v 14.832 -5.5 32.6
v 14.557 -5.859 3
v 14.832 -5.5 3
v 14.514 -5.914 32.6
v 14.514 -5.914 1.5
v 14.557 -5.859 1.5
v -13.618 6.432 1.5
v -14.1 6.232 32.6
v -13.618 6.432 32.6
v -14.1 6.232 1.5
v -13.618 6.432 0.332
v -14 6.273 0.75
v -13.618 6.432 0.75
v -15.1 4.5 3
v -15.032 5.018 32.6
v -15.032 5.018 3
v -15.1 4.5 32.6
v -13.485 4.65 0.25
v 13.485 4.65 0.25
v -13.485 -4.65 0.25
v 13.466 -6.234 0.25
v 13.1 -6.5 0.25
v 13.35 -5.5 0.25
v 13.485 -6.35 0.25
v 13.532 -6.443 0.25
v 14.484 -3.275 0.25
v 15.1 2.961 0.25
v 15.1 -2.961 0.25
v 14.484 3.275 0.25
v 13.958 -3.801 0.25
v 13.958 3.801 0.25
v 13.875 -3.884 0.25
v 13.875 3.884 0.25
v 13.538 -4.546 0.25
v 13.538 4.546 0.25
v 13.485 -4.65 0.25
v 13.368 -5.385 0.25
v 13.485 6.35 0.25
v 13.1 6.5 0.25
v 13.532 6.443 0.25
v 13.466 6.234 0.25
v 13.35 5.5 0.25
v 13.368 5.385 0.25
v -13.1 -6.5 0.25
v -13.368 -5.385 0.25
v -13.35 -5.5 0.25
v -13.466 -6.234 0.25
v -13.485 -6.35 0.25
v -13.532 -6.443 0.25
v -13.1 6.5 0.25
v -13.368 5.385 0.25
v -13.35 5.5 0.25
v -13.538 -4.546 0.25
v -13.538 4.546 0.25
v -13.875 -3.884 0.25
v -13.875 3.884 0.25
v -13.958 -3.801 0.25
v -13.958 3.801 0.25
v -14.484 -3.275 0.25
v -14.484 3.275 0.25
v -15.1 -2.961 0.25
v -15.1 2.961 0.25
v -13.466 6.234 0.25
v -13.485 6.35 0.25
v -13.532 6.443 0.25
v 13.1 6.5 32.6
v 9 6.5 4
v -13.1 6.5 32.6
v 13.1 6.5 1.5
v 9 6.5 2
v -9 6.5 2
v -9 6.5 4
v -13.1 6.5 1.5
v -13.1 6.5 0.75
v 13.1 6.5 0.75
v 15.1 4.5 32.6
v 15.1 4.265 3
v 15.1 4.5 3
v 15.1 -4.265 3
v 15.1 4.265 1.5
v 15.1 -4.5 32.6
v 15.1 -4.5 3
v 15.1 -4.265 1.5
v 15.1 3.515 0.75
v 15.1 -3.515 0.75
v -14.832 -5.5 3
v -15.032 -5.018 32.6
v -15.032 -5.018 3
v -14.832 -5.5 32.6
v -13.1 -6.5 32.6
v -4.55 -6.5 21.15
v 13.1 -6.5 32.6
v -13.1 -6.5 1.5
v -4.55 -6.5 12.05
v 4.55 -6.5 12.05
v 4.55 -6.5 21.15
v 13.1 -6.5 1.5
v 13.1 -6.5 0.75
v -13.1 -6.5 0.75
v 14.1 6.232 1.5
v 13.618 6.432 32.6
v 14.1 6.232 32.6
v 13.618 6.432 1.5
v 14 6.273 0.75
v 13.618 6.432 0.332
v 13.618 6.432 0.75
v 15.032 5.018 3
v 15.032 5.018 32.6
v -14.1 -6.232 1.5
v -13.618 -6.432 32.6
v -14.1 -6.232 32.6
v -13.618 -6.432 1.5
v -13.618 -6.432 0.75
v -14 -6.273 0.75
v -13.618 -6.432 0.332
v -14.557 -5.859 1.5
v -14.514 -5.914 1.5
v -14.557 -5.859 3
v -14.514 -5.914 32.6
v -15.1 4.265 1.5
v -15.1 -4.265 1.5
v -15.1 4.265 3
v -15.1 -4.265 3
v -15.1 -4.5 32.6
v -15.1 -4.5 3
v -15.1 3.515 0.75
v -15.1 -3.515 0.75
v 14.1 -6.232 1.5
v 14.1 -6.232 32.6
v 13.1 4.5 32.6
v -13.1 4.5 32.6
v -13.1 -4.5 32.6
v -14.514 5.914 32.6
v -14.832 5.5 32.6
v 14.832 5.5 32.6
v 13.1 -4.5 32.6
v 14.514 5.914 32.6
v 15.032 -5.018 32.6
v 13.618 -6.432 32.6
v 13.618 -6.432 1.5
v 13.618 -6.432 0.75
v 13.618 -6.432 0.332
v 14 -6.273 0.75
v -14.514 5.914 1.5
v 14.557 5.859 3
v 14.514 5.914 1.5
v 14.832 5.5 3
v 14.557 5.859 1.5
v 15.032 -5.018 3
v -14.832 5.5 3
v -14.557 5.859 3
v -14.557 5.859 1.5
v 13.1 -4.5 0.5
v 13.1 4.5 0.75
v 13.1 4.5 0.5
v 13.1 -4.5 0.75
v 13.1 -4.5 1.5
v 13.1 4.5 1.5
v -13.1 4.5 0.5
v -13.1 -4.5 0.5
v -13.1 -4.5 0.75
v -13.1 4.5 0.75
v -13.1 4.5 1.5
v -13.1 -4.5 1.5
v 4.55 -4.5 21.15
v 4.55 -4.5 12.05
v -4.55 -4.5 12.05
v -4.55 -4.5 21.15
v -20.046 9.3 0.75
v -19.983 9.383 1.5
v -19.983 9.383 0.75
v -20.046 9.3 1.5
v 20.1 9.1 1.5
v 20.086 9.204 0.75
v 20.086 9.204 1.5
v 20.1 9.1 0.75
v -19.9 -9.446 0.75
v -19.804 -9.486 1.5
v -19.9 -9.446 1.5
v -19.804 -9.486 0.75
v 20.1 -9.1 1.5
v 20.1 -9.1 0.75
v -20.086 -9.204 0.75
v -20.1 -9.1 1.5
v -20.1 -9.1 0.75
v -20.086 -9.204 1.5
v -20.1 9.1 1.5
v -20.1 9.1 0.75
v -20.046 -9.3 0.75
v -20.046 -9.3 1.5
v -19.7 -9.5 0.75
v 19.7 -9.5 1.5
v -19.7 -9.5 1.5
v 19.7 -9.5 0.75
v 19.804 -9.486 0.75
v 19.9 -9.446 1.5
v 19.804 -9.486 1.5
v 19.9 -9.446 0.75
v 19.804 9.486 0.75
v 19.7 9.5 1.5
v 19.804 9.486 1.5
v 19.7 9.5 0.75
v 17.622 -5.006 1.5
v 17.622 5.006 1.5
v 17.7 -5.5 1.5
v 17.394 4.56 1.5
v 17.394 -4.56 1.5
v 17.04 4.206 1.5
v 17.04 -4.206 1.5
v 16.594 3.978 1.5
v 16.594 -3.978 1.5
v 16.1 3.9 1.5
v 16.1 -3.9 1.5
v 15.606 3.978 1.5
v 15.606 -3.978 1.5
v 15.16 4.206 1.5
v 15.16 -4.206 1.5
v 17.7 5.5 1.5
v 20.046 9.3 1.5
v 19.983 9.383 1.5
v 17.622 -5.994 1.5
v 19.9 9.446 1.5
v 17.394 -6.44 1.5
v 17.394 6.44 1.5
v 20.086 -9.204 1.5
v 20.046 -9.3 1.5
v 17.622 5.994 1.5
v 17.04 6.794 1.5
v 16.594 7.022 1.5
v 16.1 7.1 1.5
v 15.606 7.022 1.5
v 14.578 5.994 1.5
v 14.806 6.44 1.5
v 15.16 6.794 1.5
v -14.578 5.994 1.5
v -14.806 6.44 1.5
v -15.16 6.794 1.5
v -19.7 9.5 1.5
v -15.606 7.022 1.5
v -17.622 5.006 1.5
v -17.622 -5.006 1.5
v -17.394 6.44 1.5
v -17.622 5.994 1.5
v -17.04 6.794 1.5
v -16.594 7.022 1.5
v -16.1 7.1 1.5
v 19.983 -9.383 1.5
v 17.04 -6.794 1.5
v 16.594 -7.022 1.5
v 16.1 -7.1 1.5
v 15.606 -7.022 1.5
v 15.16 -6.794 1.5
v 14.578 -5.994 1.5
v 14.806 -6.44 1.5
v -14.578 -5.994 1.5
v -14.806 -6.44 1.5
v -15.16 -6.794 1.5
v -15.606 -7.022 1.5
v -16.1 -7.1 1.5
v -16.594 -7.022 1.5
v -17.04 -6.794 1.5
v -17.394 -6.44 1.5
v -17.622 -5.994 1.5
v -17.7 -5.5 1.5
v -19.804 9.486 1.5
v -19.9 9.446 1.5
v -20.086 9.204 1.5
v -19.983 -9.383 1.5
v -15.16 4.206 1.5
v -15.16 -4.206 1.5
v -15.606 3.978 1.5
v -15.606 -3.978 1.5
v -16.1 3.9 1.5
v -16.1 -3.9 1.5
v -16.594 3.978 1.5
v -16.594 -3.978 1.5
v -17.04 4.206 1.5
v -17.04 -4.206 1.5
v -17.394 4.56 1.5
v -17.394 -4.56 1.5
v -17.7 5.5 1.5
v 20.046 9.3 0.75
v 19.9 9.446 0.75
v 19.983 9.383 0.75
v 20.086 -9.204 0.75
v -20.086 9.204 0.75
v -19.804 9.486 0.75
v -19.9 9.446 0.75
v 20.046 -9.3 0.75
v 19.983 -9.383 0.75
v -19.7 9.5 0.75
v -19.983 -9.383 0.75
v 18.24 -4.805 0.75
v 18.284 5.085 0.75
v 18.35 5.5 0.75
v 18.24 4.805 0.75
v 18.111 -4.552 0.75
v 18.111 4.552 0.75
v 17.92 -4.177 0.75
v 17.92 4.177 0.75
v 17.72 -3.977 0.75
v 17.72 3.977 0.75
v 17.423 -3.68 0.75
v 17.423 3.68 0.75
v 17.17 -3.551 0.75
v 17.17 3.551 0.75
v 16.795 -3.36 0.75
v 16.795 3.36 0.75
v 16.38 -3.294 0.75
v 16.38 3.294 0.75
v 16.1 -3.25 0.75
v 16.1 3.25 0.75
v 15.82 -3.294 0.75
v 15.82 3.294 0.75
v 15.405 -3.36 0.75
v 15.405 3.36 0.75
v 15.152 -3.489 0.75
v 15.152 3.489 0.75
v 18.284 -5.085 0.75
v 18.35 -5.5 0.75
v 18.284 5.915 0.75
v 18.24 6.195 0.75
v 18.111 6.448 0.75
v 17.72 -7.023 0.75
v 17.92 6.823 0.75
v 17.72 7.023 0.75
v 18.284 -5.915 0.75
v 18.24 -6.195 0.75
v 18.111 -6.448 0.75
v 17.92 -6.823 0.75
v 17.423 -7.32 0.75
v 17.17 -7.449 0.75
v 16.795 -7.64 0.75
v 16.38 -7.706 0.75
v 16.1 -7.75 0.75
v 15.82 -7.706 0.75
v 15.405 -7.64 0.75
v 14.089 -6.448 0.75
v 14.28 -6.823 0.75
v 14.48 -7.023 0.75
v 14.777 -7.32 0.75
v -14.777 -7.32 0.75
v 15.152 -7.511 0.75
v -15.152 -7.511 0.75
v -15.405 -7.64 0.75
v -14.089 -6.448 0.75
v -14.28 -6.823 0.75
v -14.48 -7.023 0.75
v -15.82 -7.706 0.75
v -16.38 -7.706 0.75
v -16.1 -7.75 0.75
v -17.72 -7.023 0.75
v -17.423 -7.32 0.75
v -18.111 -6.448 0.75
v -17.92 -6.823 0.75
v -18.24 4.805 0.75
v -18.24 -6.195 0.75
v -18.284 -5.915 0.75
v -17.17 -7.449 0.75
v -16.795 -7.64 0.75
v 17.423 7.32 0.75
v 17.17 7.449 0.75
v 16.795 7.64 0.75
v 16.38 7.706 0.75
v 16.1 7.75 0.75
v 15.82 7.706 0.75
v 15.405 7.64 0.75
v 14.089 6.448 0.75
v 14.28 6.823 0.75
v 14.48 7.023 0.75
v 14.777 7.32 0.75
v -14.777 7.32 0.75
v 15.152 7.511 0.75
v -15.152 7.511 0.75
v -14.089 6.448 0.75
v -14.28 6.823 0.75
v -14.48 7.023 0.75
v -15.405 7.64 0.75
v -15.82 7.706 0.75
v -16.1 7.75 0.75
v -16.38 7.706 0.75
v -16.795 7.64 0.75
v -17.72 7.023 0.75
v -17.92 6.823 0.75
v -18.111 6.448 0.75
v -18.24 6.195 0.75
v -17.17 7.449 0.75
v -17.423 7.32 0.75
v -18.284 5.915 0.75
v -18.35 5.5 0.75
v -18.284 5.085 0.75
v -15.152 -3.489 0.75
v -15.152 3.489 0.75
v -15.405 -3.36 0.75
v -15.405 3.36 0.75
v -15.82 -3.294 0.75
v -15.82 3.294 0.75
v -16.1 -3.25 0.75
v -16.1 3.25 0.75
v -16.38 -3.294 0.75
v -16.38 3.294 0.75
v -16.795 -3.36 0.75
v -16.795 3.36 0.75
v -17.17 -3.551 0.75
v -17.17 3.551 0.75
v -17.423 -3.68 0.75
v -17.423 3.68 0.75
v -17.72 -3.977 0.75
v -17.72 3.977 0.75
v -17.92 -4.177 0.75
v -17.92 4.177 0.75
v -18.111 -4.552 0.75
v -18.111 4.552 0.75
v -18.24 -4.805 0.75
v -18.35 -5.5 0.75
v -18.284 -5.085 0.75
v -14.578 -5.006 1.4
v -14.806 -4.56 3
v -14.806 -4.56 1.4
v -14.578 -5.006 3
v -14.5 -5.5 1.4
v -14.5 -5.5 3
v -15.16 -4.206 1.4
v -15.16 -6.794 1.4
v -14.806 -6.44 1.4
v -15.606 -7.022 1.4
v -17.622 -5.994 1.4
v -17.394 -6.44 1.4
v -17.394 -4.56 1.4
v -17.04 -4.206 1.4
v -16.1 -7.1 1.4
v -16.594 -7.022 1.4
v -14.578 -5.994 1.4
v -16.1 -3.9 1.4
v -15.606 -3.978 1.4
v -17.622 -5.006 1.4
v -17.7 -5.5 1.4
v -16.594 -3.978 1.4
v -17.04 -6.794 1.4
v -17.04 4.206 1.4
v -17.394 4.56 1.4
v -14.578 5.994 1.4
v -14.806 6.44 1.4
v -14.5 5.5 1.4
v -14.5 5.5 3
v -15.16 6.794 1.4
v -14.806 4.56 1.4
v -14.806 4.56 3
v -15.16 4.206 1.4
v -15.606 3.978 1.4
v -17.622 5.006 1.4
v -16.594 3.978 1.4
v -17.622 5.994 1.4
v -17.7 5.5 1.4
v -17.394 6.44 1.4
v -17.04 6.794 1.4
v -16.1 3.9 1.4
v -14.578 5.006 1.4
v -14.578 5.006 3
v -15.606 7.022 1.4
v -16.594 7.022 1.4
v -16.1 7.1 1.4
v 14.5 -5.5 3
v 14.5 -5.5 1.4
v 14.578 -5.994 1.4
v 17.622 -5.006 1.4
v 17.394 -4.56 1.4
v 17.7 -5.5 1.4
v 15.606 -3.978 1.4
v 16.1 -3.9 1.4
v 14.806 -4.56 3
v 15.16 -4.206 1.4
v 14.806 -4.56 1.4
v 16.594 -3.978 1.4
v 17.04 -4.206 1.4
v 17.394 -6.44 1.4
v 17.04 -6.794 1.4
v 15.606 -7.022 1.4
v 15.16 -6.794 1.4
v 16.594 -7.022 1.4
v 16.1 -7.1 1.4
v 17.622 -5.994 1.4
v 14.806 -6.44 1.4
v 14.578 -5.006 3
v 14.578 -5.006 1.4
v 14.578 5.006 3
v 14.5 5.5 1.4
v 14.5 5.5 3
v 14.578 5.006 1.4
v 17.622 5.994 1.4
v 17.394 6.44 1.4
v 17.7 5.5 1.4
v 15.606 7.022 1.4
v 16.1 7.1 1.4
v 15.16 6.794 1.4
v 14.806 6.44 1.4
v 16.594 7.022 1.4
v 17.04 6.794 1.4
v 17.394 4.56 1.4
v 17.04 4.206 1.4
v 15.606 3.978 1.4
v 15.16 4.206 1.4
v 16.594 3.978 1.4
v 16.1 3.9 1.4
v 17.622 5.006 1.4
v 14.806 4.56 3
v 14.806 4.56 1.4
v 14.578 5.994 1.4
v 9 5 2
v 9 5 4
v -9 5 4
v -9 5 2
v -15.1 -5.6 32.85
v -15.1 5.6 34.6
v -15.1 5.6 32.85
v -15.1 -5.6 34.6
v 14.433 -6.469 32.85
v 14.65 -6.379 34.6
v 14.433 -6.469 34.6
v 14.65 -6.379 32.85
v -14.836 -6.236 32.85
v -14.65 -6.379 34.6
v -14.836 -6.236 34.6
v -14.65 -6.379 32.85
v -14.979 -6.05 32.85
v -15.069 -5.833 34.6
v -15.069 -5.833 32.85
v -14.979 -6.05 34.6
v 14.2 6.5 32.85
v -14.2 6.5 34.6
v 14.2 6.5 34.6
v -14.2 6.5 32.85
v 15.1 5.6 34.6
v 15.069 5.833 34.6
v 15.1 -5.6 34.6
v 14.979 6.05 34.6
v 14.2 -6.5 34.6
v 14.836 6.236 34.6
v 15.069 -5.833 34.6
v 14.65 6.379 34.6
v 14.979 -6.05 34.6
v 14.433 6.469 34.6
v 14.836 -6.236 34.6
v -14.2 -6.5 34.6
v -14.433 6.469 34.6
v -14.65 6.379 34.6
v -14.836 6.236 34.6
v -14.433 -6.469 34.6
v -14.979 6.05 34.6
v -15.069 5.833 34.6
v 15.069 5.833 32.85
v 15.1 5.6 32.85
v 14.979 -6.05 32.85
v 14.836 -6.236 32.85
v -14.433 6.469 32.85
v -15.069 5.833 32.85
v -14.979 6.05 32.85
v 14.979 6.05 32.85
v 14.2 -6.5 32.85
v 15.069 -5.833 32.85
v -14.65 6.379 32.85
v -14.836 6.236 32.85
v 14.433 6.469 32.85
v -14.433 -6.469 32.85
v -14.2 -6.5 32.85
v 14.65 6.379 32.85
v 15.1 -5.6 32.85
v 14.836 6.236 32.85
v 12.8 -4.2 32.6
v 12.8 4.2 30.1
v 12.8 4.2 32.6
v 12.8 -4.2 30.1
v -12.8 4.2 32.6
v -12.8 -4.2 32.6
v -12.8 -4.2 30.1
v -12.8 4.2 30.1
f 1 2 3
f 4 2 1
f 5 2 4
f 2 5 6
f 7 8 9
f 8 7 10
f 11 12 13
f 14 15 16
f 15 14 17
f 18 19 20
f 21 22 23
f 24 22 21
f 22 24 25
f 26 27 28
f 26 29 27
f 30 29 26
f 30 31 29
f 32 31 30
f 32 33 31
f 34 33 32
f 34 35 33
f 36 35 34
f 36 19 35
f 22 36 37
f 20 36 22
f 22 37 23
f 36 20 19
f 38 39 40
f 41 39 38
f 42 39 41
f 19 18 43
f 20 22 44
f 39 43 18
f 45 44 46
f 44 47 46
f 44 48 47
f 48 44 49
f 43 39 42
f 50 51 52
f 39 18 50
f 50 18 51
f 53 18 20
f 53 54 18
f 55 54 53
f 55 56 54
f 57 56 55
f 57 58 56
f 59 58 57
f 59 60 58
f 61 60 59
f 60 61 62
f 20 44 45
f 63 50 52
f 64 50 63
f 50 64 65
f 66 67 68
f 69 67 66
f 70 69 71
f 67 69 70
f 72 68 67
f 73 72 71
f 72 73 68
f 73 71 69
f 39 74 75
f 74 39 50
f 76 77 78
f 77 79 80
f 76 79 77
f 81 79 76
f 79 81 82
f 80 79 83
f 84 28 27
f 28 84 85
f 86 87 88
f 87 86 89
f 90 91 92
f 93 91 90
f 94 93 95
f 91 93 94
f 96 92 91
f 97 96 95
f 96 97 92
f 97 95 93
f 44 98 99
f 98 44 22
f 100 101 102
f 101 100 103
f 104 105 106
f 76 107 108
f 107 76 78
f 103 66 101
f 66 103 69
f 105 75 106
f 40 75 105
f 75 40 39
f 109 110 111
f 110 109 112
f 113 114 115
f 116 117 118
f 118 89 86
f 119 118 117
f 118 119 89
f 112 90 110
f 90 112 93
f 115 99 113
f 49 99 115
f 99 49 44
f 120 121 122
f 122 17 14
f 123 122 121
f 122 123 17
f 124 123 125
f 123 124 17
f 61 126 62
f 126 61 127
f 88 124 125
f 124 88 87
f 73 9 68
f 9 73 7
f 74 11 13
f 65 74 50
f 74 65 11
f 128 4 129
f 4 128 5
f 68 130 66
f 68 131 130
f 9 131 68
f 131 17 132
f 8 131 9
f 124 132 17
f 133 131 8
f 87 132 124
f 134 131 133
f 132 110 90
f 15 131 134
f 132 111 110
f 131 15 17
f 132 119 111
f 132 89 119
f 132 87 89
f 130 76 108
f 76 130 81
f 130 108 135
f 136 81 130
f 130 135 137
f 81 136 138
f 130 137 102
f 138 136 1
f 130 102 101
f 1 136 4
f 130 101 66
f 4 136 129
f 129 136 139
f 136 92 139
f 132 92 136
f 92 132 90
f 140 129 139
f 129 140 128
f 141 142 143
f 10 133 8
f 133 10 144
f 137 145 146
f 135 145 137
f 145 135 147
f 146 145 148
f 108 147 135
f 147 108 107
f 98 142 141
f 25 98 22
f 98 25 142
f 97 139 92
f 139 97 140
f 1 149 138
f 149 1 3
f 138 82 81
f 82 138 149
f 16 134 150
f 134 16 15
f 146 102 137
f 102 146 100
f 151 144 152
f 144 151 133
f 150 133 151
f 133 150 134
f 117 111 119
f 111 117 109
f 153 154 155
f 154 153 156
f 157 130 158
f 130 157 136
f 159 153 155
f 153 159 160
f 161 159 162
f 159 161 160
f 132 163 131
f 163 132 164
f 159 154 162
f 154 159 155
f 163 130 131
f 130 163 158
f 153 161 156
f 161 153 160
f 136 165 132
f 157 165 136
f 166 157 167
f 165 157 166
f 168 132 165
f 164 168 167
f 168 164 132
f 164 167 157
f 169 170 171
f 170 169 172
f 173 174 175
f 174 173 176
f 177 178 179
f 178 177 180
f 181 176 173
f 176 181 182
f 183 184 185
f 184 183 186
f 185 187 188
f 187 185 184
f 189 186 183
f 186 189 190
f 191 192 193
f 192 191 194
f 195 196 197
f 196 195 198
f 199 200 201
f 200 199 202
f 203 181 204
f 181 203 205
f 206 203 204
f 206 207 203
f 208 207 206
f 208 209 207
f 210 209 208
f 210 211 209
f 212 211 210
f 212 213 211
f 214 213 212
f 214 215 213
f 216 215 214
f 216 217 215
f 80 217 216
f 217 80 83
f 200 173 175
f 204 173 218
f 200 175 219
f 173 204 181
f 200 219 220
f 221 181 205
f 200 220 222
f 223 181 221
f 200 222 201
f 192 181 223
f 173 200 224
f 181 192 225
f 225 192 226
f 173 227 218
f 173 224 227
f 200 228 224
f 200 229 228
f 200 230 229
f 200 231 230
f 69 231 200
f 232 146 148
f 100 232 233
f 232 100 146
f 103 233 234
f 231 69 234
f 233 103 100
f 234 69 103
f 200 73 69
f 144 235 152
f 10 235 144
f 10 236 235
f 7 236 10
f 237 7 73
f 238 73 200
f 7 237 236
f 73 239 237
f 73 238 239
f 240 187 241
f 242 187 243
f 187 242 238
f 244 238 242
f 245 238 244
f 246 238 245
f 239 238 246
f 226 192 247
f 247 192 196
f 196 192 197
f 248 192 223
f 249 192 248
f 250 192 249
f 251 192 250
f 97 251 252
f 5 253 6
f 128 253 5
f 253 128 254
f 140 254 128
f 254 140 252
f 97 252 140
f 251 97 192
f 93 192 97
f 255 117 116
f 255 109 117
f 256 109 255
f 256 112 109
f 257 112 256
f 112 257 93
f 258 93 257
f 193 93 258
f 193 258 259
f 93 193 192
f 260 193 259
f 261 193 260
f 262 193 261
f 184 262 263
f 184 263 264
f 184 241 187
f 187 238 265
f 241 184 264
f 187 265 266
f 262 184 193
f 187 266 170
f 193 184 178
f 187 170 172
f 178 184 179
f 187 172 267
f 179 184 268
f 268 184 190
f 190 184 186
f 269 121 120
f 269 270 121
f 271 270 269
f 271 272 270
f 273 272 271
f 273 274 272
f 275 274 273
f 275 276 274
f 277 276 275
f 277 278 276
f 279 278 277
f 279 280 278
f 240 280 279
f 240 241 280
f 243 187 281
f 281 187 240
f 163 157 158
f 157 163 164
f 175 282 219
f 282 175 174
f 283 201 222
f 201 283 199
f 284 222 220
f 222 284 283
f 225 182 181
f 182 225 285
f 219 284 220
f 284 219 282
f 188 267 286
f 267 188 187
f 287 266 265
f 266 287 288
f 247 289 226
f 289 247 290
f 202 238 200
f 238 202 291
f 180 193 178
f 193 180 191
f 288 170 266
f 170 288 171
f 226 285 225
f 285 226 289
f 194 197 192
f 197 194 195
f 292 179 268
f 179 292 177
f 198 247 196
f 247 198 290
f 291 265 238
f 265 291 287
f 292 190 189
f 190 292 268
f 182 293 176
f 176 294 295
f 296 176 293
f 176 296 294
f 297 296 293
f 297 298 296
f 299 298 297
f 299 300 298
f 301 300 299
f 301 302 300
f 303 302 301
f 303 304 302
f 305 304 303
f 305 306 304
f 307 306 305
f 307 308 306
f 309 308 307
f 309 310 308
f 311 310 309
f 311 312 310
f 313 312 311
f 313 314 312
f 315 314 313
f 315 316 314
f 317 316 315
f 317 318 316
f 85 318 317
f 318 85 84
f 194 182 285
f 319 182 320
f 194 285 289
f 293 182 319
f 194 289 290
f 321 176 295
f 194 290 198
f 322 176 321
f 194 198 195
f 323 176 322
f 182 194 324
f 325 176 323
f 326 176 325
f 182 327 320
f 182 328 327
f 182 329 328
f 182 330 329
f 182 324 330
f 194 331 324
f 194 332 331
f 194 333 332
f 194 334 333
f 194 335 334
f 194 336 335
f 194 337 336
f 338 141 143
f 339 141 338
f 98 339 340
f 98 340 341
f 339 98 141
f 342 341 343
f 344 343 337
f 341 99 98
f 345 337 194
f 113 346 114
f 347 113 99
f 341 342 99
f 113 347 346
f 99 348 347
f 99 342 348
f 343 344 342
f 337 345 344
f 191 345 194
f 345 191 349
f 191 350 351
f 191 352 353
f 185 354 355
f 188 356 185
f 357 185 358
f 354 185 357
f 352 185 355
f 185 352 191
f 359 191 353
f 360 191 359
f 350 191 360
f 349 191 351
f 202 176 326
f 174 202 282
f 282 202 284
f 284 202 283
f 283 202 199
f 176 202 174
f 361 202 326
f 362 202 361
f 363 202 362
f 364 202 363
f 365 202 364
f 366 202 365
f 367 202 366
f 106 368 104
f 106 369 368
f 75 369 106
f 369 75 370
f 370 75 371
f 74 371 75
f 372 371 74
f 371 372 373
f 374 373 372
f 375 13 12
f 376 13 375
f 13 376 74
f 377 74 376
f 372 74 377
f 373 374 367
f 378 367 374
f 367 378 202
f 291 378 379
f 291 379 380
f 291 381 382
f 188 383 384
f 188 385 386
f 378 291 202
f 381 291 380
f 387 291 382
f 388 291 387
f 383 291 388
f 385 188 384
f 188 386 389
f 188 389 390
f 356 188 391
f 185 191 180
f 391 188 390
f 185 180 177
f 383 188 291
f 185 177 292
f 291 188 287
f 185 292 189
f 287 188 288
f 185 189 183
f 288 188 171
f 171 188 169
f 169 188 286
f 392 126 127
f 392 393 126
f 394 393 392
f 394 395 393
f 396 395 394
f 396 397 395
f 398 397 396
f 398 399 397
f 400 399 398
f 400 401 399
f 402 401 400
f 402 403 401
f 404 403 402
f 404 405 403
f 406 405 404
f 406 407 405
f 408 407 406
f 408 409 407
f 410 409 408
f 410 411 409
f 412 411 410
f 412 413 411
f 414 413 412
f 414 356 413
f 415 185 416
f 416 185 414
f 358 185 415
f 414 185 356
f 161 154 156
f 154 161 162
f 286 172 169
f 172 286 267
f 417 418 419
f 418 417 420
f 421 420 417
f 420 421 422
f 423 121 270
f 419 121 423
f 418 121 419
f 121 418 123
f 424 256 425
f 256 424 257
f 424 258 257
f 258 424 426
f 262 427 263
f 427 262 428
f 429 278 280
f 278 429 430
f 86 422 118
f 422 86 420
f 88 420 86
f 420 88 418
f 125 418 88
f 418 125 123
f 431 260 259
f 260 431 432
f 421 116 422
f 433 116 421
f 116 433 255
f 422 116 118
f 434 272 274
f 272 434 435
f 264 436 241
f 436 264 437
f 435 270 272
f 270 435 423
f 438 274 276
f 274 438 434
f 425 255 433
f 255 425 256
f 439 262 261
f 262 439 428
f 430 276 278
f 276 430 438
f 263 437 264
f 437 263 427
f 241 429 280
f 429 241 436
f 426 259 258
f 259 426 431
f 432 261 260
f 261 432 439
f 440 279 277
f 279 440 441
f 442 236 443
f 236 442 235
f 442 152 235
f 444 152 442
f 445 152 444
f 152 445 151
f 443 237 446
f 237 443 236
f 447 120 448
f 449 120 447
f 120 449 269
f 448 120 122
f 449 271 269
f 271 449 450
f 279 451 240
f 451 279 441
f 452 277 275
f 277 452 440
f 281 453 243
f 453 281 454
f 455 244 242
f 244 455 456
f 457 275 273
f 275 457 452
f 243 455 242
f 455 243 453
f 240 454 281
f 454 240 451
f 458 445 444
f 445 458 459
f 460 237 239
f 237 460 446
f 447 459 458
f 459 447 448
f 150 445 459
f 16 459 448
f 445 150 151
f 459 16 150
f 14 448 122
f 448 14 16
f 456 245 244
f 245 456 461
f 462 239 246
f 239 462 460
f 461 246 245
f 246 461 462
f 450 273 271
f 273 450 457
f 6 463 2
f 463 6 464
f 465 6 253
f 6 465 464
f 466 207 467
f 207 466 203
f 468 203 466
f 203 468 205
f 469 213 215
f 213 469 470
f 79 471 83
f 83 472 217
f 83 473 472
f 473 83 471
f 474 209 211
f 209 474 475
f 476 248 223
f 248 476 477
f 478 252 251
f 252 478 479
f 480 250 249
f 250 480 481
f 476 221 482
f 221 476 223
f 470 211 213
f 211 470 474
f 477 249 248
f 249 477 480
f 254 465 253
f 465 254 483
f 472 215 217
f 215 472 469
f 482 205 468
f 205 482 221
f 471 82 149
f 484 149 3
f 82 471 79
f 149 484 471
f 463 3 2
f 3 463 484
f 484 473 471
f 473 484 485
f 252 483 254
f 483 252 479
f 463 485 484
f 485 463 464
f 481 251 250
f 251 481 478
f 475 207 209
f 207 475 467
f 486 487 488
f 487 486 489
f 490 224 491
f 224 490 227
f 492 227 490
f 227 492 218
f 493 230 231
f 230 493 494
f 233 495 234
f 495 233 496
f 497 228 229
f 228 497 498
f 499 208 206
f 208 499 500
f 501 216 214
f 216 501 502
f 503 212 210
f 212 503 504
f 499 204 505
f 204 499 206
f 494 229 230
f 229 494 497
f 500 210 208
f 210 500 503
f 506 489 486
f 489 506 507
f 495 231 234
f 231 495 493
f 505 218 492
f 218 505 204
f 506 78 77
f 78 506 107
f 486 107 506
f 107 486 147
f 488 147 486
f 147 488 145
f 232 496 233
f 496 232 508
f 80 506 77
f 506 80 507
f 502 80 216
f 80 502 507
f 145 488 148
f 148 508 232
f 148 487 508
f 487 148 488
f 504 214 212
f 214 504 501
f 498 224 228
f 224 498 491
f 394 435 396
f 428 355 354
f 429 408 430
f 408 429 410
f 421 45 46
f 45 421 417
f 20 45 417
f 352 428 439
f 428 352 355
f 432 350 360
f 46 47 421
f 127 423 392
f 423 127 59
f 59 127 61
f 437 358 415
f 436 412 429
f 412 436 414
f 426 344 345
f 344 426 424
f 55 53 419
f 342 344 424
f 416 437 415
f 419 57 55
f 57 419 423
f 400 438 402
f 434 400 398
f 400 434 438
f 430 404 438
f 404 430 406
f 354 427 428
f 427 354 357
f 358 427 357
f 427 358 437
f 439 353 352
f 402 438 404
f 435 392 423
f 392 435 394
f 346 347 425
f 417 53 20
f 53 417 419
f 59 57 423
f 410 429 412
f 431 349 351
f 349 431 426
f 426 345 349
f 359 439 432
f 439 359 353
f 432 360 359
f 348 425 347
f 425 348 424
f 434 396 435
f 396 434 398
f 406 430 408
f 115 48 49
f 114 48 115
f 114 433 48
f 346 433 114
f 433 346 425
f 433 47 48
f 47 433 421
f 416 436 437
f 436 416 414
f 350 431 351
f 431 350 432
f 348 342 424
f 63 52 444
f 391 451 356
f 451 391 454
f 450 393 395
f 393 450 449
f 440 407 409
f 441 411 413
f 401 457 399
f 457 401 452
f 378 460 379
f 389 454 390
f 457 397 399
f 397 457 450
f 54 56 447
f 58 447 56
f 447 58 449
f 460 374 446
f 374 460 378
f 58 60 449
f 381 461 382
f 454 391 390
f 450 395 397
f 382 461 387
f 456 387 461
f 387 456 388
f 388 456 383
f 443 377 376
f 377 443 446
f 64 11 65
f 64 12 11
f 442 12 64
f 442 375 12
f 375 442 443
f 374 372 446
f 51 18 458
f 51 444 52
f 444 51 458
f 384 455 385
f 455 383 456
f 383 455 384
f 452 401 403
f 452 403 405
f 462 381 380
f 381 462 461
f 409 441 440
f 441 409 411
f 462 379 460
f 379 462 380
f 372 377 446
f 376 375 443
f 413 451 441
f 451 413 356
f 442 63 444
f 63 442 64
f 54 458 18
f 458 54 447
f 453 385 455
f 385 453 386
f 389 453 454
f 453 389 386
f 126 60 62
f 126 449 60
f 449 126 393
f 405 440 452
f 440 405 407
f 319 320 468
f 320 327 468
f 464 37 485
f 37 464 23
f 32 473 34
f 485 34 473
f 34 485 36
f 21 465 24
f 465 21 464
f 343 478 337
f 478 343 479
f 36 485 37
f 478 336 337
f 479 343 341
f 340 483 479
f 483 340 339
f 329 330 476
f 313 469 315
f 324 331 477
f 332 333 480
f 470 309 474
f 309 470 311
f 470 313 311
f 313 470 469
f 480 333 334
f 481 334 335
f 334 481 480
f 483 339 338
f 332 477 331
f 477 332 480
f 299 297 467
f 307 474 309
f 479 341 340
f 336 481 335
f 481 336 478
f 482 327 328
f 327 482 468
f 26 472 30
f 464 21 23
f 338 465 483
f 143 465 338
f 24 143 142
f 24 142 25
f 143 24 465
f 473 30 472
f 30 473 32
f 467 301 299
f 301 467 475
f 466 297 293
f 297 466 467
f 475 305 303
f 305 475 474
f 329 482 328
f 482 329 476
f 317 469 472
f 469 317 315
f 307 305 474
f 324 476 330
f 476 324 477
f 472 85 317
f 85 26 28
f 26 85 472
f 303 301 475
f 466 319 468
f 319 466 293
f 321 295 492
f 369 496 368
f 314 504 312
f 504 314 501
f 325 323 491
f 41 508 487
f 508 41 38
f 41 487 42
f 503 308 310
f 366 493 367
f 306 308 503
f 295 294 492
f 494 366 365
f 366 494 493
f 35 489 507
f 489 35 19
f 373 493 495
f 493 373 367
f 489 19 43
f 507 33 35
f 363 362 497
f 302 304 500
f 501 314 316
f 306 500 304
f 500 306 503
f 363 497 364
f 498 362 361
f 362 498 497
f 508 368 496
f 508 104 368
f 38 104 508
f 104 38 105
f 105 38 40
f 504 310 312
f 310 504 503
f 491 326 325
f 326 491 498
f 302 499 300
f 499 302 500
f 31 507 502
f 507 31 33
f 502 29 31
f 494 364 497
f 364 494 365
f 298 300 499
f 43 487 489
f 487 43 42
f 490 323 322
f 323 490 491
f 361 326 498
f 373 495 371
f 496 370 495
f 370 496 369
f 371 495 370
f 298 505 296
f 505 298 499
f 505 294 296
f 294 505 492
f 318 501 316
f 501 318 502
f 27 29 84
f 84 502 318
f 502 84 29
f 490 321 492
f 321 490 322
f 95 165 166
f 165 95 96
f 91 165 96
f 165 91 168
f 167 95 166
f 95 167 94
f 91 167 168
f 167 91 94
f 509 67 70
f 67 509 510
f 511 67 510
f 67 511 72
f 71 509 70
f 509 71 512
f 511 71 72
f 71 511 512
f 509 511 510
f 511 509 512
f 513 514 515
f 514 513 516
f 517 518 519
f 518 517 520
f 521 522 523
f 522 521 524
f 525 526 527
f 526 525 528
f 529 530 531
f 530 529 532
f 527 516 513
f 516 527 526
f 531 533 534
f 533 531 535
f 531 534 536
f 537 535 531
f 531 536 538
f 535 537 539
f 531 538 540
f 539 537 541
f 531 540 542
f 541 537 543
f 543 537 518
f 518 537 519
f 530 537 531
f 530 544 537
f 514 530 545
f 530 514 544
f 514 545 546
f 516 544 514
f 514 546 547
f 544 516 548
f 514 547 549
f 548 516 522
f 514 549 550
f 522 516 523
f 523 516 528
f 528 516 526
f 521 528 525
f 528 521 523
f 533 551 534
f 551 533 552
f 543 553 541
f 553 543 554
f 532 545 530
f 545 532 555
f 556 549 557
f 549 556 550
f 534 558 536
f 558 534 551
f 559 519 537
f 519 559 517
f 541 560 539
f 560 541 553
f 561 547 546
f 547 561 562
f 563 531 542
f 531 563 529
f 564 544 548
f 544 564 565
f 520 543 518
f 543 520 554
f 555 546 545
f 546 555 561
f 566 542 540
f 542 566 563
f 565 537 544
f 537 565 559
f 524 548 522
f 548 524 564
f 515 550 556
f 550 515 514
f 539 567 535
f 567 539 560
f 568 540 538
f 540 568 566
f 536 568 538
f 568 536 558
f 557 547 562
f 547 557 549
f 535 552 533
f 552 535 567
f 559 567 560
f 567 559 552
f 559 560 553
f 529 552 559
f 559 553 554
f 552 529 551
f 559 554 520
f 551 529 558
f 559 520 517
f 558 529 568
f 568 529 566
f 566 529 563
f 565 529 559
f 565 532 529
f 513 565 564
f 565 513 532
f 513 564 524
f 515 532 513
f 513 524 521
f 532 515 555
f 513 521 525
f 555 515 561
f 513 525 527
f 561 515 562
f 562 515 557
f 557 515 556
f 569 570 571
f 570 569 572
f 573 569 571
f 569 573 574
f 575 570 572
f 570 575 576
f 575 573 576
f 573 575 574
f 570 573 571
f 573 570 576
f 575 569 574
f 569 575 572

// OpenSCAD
// Indoor Enclosure for Raspberry Pi Camera Rev 1.3
// Two pieces: housing + snap-on lid.
// Lens faces forward through a SQUARE port cut flush through the front wall
// (no collar, no protrusion). Board slides in from top. Lid snaps on with
// cable slot. Screw holes in base flange for mounting.

/* ── Camera board ── */
board_w      = 25;
board_h      = 24;
board_t      = 1.2;
hole_spacing = 21;
hole_dia     = 2.2;

lens_dia     = 8.5;      // lens barrel diameter
lens_h       = 5.0;      // lens height above PCB
lens_cx      = 0;        // lens X offset from board center
lens_cy      = 2.0;      // lens Y offset — ABOVE center, toward connector

/* ── Enclosure ── */
wall         = 2.0;
clearance    = 0.6;
cable_w      = 18;       // ribbon cable exit width (1.8cm)
cable_top    = 6;        // clearance above board for cable connector
corner_r     = 2;

/* Square lens port — REPLACES the old collar + circular bore.
   Same 9.1mm size as the old circular hole (0.6mm clearance). */
square_hole_side = lens_dia + 0.6;   // 9.1mm square bore
square_recess    = 3.0;              // mm the port recesses into the interior

// Base flange screws
flange_screw_dia = 3.2;  // M3 clearance

// Lid snap-fit
snap_tol     = 0.3;      // tolerance for snap fit
snap_depth   = 1.5;      // how deep the lip sits
lip_h        = 2.5;      // inner lip height on lid

/* ── Derived ──
   X = width, Y = depth (front = -Y), Z = height
   Front face is at Y = -(outer_z/2)
*/
inner_x = board_w + 2 * clearance;
inner_z = max(board_t + lens_h + 2 * clearance, 9);
inner_y = board_h + clearance + cable_top;
outer_x = inner_x + 2 * wall;
outer_z = inner_z + 2 * wall;
outer_y = inner_y + wall;   // walls on bottom + sides, lid closes top

flange_x = outer_x + 10;
flange_z = outer_z + 6;

// Lens Z (height) position from base
lens_y = wall + clearance + board_h/2 + lens_cy;

/* ══════════════════════════════
   Housing — open top, board slides in
   ══════════════════════════════ */
module camera_housing() {
    difference() {
        union() {
            // Main body — open top box
            difference() {
                rounded_box(outer_x, outer_z, outer_y, corner_r);
                // Hollow inside (open top)
                translate([0, 0, wall + inner_y/2])
                    cube([inner_x, inner_z, inner_y + wall + 1], center=true);
            }

            // Base flange
            translate([0, 0, wall/4])
                rounded_box(flange_x, flange_z, wall/2, corner_r + 2);
        }

        // --- Square lens port through the front wall (no collar) ---
        // Front face at Y = -(outer_z/2). Cut starts FLUSH with the front face,
        // goes through the full wall thickness, and recesses a little into
        // the interior so the lens has a ledge to seat against.
        port_front_y   = -(outer_z/2);                         // - front face
        port_back_y    = port_front_y + wall + square_recess;  // into interior
        port_center_y  = (port_front_y + port_back_y) / 2;
        port_y_extent  = port_back_y - port_front_y;

        translate([lens_cx, port_center_y, lens_y])
            cube([square_hole_side, port_y_extent, square_hole_side], center=true);

        // Flange screw holes (4 corners)
        for (x = [-(flange_x/2 - 4), (flange_x/2 - 4)])
            for (y = [-(flange_z/2 - 4), (flange_z/2 - 4)])
                translate([x, y, -1])
                    cylinder(d=flange_screw_dia, h=wall + 2, $fn=20);

        // Countersinks
        for (x = [-(flange_x/2 - 4), (flange_x/2 - 4)])
            for (y = [-(flange_z/2 - 4), (flange_z/2 - 4)])
                translate([x, y, -0.1])
                    cylinder(d1=flange_screw_dia + 3, d2=flange_screw_dia, h=1.5, $fn=20);

        // Cable exit slot — horizontal slit in rear wall, near bottom
        translate([0, (outer_z/2), wall + 1])
            cube([18, wall + 1, 2], center=true);
    }
}

/* ══════════════════════════════
   Lid — snaps on top, has cable slot
   ══════════════════════════════ */
module camera_lid() {
    // Cap: Y=0 to Y=wall (flat top surface)
    // Lip: Y=-lip_h to Y=0 (hangs into housing)
    union() {
        // Flat cap
        rounded_box(outer_x, outer_z, wall, corner_r);

        // Lip hanging below cap
        translate([0, 0, -lip_h/2])
            cube([inner_x - 2*snap_tol, inner_z - 2*snap_tol, lip_h], center=true);
    }

    // Snap bumps on the lip
    for (yy = [-(inner_z/2 - snap_tol - 0.3), (inner_z/2 - snap_tol - 0.3)])
        translate([0, yy, -lip_h + 0.8])
            cube([inner_x/2, 0.6, 1.5], center=true);
}

/* ── Helper ── */
module rounded_box(w, h, d, r) {
    rr = min(r, min(w, min(h, d)) / 2 - 0.1);
    translate([0, 0, d/2])
        minkowski() {
            cube([w - 2*rr, h - 2*rr, d - 0.5], center=true);
            cylinder(r=rr, h=0.25, $fn=24);
        }
}

/* ══════════════════════════════
   RENDER
   ══════════════════════════════ */

// Preview — lid on top of housing
color("Blue") camera_housing();
color("Gold") translate([0, 0, outer_y]) camera_lid();

// For STL export, render ONE at a time:
//camera_housing(); // → camera_housing.stl
//translate([0, 0, lip_h]) camera_lid(); // → camera_lid.stl
